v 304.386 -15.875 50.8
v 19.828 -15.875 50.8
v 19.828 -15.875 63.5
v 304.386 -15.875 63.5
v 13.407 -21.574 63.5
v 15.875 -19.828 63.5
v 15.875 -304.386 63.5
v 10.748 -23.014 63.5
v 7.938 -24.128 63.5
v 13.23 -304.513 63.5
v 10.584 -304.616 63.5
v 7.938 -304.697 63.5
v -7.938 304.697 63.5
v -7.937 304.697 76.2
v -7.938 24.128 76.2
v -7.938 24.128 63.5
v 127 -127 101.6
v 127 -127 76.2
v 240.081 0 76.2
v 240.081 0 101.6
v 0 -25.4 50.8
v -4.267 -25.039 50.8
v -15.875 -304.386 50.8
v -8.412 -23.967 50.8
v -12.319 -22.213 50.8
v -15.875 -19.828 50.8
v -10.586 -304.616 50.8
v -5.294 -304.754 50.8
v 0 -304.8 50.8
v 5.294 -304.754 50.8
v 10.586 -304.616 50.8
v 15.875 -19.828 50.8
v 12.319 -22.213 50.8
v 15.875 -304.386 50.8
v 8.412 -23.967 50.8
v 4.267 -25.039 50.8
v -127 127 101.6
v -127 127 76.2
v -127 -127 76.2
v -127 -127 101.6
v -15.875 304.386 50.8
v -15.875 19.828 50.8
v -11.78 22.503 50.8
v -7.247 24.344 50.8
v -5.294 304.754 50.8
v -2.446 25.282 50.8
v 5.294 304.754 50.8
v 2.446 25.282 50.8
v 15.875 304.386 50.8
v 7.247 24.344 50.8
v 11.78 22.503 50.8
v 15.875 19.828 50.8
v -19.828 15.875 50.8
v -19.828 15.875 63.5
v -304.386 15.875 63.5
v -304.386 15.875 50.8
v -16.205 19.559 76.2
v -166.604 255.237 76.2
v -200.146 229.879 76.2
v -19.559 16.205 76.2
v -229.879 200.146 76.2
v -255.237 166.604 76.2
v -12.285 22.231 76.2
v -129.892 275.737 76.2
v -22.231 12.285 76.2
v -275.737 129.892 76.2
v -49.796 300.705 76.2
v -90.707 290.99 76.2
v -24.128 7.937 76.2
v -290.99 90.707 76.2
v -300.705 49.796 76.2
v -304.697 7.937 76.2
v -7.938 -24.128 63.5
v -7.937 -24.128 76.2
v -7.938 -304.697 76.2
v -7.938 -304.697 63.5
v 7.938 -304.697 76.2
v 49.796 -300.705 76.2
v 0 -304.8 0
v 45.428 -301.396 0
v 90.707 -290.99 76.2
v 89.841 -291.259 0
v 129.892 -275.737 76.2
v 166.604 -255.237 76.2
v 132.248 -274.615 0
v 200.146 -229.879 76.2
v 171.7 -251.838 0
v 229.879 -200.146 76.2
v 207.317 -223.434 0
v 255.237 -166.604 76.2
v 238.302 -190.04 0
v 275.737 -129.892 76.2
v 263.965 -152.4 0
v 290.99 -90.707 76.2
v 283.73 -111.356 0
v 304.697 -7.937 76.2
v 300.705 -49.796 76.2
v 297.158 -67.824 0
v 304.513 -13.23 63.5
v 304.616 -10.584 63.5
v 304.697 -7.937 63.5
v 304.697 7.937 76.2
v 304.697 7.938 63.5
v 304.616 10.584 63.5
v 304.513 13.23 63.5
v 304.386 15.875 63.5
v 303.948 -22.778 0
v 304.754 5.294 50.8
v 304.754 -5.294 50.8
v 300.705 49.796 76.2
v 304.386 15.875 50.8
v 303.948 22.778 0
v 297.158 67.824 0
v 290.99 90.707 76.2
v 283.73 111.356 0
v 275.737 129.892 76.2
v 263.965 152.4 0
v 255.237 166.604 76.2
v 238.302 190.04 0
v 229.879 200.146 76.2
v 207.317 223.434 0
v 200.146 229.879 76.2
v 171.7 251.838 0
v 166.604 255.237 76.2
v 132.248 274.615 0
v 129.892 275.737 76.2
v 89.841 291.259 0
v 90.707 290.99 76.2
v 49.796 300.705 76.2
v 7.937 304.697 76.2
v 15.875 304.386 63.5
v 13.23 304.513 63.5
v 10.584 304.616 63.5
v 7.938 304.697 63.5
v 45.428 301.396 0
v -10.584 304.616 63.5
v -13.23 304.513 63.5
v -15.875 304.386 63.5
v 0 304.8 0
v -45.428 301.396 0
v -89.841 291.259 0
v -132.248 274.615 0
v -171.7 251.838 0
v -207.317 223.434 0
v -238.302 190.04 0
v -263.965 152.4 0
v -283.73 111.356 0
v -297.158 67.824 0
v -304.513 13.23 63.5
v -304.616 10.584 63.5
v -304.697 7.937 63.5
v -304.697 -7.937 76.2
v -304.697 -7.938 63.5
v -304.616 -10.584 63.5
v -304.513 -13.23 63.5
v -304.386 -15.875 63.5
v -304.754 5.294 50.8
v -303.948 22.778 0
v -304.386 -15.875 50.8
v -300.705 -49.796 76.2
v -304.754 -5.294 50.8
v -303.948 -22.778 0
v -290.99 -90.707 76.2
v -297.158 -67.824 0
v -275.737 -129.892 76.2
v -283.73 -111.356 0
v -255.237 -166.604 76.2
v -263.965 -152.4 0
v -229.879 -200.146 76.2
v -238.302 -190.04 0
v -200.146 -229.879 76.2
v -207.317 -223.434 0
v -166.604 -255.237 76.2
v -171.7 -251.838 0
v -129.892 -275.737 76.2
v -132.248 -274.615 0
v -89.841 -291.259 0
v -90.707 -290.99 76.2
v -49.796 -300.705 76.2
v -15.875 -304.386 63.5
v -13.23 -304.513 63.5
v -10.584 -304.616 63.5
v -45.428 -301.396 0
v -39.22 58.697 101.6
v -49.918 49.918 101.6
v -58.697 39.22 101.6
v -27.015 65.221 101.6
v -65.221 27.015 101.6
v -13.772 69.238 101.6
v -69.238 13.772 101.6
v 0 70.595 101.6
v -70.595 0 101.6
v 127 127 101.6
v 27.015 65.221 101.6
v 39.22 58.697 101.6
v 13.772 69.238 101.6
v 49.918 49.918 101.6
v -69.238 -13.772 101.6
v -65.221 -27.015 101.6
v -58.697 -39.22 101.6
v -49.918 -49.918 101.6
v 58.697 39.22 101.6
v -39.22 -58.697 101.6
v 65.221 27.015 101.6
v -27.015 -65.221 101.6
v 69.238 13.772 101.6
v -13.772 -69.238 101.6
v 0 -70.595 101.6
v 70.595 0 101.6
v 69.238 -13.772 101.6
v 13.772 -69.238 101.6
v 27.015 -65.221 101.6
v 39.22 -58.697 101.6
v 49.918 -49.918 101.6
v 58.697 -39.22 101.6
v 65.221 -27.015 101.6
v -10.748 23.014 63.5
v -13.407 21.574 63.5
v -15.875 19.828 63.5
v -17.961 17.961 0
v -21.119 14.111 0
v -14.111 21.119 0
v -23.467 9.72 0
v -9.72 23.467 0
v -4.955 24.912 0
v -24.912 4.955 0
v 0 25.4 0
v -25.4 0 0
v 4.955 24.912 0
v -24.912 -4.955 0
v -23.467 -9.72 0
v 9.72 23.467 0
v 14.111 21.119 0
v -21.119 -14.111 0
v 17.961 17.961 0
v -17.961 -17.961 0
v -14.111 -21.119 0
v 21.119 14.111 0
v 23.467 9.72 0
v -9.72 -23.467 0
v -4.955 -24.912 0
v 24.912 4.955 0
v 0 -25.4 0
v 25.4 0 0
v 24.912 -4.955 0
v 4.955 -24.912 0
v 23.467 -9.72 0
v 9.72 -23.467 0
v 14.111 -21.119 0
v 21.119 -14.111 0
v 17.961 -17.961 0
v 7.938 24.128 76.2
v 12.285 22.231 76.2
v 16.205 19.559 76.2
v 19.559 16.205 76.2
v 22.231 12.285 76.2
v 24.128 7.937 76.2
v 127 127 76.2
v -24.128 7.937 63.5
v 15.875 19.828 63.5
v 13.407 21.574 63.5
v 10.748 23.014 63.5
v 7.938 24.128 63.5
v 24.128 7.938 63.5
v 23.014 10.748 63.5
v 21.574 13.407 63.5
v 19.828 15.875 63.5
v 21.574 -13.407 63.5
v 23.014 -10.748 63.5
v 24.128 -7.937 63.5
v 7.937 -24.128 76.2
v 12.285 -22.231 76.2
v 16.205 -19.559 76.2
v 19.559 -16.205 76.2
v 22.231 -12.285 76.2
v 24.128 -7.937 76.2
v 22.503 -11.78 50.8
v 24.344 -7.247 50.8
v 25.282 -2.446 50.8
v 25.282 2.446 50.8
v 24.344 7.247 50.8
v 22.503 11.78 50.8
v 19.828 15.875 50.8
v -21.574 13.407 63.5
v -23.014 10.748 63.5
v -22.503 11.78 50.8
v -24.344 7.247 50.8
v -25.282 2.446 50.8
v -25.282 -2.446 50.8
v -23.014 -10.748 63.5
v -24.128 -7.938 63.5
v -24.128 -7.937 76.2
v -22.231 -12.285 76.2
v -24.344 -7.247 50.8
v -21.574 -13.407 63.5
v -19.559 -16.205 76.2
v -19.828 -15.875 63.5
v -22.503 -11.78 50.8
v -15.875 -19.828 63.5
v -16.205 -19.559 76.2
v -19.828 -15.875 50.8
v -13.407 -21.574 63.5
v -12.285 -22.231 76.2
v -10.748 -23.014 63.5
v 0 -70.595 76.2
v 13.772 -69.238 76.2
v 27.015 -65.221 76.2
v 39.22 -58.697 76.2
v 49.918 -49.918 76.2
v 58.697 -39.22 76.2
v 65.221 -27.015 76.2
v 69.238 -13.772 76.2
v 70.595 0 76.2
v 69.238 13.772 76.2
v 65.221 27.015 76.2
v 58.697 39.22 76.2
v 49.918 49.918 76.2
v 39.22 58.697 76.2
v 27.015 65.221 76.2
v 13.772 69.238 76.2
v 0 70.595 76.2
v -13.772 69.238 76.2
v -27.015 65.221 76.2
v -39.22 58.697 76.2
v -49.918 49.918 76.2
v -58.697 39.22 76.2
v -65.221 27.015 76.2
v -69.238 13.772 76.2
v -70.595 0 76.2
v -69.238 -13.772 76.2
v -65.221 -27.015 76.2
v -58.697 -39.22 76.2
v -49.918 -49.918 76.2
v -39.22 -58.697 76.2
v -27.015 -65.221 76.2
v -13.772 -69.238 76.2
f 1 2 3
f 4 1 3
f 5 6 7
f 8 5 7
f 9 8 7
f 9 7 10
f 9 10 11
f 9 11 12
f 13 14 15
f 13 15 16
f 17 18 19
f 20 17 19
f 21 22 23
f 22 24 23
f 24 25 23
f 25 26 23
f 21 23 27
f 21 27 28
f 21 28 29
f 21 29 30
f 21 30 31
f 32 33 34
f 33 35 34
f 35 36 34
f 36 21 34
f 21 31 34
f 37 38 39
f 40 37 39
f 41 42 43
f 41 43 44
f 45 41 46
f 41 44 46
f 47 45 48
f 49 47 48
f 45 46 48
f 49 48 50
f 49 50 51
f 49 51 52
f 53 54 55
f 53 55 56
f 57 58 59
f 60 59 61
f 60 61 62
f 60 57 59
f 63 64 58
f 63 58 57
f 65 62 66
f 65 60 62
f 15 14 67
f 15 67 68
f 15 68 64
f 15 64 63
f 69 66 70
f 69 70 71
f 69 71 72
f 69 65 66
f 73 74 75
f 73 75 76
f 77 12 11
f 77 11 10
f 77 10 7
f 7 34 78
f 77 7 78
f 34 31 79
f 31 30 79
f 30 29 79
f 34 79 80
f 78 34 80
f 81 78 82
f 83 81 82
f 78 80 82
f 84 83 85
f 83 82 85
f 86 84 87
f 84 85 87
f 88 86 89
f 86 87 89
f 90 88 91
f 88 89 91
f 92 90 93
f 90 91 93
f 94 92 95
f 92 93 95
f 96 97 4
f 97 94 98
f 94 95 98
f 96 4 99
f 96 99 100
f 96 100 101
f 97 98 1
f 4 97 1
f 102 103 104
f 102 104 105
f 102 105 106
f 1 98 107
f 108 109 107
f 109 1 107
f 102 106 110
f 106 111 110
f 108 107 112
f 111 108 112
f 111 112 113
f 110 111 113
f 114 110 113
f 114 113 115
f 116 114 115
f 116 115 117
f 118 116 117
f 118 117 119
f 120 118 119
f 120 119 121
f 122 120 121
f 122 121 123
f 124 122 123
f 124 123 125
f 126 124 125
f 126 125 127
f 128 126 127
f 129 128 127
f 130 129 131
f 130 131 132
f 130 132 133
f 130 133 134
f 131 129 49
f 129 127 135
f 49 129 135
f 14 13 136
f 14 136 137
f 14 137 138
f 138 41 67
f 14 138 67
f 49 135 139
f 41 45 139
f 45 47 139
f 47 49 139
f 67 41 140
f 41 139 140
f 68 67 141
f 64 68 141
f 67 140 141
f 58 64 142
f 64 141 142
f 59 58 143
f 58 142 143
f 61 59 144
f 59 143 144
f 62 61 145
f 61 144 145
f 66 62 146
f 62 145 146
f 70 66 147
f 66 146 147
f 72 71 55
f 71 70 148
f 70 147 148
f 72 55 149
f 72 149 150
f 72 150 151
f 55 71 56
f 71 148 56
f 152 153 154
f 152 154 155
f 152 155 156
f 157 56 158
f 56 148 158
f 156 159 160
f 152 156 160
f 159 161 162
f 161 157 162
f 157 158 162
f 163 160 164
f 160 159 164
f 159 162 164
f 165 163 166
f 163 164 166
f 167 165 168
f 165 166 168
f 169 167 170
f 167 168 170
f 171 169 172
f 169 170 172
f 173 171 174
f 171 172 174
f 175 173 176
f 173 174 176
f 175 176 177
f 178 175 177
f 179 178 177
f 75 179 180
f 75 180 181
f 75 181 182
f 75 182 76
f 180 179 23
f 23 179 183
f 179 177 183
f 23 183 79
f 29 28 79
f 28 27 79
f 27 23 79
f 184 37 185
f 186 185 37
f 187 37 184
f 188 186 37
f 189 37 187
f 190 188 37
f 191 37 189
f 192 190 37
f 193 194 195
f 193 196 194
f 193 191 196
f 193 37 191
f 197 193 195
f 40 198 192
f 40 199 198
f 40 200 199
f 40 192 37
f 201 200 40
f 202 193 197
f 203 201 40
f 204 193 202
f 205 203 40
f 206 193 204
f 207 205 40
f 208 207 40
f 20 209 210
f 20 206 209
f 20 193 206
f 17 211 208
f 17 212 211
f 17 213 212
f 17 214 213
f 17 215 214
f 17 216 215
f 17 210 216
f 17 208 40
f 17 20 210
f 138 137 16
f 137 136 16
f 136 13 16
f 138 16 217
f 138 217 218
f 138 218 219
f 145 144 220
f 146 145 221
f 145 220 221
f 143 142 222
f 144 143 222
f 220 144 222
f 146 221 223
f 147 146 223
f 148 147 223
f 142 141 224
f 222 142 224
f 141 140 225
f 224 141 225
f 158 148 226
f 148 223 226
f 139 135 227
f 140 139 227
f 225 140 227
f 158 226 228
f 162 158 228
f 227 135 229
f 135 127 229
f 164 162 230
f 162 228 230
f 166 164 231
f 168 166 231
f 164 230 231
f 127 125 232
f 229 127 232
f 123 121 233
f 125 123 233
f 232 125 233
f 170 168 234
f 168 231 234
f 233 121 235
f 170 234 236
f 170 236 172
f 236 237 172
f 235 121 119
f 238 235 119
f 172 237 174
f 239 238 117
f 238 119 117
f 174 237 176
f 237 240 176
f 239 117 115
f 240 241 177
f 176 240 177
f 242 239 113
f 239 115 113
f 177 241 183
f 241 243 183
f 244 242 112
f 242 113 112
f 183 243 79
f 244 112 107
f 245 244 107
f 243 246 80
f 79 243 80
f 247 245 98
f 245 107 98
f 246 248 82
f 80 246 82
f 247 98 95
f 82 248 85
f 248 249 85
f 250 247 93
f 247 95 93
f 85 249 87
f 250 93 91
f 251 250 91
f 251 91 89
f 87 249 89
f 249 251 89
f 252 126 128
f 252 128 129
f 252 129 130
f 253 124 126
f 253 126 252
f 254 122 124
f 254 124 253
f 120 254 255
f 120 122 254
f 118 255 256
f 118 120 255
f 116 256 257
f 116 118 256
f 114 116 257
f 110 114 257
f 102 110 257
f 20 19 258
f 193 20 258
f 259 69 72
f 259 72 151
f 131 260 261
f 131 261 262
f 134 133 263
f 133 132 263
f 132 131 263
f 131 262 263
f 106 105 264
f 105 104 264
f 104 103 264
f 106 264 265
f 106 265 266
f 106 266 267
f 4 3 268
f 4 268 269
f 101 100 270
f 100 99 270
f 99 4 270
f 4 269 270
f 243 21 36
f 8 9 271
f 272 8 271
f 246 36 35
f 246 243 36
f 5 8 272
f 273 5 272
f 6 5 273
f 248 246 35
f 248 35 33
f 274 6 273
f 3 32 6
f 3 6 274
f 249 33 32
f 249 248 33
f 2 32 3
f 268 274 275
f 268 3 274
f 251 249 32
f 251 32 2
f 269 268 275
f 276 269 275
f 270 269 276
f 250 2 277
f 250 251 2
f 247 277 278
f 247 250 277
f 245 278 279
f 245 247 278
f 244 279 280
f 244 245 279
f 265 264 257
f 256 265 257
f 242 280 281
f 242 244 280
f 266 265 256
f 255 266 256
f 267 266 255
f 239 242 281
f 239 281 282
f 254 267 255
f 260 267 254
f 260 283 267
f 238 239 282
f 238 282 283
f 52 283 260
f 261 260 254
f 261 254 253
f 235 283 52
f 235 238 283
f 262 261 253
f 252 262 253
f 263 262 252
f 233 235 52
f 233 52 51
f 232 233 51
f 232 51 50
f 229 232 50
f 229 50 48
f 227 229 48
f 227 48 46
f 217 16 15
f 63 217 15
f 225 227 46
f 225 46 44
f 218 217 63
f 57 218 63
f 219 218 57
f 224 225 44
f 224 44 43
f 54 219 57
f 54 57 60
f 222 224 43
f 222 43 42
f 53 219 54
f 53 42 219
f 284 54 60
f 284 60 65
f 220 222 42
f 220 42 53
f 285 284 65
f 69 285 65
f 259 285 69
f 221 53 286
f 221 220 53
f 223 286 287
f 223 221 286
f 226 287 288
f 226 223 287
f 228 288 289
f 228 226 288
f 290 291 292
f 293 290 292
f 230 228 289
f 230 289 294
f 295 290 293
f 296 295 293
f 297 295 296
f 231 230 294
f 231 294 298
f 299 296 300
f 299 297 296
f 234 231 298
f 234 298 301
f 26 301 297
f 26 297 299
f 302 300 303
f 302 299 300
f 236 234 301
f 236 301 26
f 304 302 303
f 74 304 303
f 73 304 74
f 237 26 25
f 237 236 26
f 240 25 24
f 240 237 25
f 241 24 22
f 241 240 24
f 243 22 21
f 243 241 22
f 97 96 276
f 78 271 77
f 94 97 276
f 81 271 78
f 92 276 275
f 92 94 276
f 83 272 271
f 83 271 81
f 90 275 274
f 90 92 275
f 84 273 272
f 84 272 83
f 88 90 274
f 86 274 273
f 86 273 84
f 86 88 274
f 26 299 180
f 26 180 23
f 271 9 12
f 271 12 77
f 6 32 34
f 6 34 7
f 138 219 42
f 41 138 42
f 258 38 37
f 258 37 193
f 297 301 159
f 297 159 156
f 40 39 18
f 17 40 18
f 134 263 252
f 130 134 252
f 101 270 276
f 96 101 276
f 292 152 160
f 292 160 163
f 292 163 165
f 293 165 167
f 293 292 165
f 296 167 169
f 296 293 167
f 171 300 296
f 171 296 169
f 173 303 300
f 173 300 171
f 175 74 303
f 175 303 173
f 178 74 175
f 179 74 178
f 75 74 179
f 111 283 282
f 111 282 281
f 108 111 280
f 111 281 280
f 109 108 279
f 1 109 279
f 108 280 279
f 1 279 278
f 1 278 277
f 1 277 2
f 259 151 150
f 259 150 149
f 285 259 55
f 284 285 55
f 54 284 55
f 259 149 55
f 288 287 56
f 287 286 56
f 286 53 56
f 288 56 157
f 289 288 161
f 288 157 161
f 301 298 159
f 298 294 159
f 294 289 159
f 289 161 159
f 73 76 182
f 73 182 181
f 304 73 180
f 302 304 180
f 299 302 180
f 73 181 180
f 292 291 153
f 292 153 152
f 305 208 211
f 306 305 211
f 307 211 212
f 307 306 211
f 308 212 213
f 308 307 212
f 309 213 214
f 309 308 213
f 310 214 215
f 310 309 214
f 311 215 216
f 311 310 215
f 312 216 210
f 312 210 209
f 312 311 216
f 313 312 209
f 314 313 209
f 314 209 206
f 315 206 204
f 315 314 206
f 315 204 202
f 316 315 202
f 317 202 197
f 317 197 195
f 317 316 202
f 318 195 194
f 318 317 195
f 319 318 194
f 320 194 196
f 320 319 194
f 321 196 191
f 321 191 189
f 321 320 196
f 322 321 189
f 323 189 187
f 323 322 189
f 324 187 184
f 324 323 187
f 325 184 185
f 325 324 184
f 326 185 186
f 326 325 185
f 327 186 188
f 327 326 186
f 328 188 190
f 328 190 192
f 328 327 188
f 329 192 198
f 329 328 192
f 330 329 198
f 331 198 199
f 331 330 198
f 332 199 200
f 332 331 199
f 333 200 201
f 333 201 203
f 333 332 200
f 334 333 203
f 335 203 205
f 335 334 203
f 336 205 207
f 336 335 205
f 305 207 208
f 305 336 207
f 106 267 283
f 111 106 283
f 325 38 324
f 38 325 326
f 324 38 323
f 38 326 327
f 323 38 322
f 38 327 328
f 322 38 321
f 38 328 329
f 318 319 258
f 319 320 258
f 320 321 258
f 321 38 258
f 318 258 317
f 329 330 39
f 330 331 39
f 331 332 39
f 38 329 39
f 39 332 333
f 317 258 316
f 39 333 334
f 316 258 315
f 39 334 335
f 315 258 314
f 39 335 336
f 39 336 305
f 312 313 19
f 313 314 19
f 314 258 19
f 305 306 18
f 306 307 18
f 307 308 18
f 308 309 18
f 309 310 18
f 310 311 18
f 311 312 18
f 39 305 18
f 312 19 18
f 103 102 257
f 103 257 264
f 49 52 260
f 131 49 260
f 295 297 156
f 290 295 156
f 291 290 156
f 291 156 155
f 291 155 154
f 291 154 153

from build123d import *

# Parameters (mm, degrees)
F0_R          = 304.8
F0_R_2        = 25.4
F1_DEPTH      = 76.2
F3_DEPTH      = 304.801
F3_DEPTH_BACK = 304.801
F4_COUNT      = 2
F4_ANGLE      = 90
F6_W          = 254
F6_H          = 254
F6_R          = 70.594601
F7_DEPTH      = 25.4
F8_ANGLE      = -90


with BuildPart() as f1:
    # F0 (on Top) → F1 (new body)
    with BuildSketch(Plane.XY):
        Circle(F0_R)
        Circle(F0_R_2, mode=Mode.SUBTRACT)
    extrude(amount=F1_DEPTH)


with BuildPart() as f3:
    # F2 (on Front) → F3 (new body, two sides)
    with BuildSketch(Plane.XZ) as f3_sk:
        Polygon((7.9375, 76.2), (-7.9375, 76.2), (-7.9375, 63.5), (-15.875, 63.5), (-15.875, 50.8), (15.875, 50.8), (15.875, 63.5), (7.9375, 63.5), align=None)
    extrude(amount=F3_DEPTH)
    extrude(f3_sk.sketch, amount=-F3_DEPTH_BACK)


with BuildPart() as f4_1:
    # F4: instance of F3
    add(f3.part.rotate(Axis((0, 0, 58.865096), (0, 0, 1)), 1 * F4_ANGLE / (F4_COUNT - 1)))


with BuildPart() as f1_1:
    add(f1.part)

    # F5: cut F4_1, F3
    add(f4_1.part, mode=Mode.SUBTRACT)
    add(f3.part, mode=Mode.SUBTRACT)


with BuildPart() as f7:
    # F6 (on face) → F7 (new body)
    with BuildSketch(Plane.XY.offset(76.2)):
        Rectangle(F6_W, F6_H)
        Circle(F6_R, mode=Mode.SUBTRACT)
        Polygon((0, 240.081295), (-127, 127), (127, 127), align=None)
    extrude(amount=F7_DEPTH)


with BuildPart() as f1_2:
    # F8: moved
    add(f1_1.part.rotate(Axis((0, 0, 58.865096), (0, 0, 1)), F8_ANGLE))


with BuildPart() as f7_1:
    # F8: moved
    add(f7.part.rotate(Axis((0, 0, 58.865096), (0, 0, 1)), F8_ANGLE))


solid = Compound([f1_2.part, f7_1.part])
